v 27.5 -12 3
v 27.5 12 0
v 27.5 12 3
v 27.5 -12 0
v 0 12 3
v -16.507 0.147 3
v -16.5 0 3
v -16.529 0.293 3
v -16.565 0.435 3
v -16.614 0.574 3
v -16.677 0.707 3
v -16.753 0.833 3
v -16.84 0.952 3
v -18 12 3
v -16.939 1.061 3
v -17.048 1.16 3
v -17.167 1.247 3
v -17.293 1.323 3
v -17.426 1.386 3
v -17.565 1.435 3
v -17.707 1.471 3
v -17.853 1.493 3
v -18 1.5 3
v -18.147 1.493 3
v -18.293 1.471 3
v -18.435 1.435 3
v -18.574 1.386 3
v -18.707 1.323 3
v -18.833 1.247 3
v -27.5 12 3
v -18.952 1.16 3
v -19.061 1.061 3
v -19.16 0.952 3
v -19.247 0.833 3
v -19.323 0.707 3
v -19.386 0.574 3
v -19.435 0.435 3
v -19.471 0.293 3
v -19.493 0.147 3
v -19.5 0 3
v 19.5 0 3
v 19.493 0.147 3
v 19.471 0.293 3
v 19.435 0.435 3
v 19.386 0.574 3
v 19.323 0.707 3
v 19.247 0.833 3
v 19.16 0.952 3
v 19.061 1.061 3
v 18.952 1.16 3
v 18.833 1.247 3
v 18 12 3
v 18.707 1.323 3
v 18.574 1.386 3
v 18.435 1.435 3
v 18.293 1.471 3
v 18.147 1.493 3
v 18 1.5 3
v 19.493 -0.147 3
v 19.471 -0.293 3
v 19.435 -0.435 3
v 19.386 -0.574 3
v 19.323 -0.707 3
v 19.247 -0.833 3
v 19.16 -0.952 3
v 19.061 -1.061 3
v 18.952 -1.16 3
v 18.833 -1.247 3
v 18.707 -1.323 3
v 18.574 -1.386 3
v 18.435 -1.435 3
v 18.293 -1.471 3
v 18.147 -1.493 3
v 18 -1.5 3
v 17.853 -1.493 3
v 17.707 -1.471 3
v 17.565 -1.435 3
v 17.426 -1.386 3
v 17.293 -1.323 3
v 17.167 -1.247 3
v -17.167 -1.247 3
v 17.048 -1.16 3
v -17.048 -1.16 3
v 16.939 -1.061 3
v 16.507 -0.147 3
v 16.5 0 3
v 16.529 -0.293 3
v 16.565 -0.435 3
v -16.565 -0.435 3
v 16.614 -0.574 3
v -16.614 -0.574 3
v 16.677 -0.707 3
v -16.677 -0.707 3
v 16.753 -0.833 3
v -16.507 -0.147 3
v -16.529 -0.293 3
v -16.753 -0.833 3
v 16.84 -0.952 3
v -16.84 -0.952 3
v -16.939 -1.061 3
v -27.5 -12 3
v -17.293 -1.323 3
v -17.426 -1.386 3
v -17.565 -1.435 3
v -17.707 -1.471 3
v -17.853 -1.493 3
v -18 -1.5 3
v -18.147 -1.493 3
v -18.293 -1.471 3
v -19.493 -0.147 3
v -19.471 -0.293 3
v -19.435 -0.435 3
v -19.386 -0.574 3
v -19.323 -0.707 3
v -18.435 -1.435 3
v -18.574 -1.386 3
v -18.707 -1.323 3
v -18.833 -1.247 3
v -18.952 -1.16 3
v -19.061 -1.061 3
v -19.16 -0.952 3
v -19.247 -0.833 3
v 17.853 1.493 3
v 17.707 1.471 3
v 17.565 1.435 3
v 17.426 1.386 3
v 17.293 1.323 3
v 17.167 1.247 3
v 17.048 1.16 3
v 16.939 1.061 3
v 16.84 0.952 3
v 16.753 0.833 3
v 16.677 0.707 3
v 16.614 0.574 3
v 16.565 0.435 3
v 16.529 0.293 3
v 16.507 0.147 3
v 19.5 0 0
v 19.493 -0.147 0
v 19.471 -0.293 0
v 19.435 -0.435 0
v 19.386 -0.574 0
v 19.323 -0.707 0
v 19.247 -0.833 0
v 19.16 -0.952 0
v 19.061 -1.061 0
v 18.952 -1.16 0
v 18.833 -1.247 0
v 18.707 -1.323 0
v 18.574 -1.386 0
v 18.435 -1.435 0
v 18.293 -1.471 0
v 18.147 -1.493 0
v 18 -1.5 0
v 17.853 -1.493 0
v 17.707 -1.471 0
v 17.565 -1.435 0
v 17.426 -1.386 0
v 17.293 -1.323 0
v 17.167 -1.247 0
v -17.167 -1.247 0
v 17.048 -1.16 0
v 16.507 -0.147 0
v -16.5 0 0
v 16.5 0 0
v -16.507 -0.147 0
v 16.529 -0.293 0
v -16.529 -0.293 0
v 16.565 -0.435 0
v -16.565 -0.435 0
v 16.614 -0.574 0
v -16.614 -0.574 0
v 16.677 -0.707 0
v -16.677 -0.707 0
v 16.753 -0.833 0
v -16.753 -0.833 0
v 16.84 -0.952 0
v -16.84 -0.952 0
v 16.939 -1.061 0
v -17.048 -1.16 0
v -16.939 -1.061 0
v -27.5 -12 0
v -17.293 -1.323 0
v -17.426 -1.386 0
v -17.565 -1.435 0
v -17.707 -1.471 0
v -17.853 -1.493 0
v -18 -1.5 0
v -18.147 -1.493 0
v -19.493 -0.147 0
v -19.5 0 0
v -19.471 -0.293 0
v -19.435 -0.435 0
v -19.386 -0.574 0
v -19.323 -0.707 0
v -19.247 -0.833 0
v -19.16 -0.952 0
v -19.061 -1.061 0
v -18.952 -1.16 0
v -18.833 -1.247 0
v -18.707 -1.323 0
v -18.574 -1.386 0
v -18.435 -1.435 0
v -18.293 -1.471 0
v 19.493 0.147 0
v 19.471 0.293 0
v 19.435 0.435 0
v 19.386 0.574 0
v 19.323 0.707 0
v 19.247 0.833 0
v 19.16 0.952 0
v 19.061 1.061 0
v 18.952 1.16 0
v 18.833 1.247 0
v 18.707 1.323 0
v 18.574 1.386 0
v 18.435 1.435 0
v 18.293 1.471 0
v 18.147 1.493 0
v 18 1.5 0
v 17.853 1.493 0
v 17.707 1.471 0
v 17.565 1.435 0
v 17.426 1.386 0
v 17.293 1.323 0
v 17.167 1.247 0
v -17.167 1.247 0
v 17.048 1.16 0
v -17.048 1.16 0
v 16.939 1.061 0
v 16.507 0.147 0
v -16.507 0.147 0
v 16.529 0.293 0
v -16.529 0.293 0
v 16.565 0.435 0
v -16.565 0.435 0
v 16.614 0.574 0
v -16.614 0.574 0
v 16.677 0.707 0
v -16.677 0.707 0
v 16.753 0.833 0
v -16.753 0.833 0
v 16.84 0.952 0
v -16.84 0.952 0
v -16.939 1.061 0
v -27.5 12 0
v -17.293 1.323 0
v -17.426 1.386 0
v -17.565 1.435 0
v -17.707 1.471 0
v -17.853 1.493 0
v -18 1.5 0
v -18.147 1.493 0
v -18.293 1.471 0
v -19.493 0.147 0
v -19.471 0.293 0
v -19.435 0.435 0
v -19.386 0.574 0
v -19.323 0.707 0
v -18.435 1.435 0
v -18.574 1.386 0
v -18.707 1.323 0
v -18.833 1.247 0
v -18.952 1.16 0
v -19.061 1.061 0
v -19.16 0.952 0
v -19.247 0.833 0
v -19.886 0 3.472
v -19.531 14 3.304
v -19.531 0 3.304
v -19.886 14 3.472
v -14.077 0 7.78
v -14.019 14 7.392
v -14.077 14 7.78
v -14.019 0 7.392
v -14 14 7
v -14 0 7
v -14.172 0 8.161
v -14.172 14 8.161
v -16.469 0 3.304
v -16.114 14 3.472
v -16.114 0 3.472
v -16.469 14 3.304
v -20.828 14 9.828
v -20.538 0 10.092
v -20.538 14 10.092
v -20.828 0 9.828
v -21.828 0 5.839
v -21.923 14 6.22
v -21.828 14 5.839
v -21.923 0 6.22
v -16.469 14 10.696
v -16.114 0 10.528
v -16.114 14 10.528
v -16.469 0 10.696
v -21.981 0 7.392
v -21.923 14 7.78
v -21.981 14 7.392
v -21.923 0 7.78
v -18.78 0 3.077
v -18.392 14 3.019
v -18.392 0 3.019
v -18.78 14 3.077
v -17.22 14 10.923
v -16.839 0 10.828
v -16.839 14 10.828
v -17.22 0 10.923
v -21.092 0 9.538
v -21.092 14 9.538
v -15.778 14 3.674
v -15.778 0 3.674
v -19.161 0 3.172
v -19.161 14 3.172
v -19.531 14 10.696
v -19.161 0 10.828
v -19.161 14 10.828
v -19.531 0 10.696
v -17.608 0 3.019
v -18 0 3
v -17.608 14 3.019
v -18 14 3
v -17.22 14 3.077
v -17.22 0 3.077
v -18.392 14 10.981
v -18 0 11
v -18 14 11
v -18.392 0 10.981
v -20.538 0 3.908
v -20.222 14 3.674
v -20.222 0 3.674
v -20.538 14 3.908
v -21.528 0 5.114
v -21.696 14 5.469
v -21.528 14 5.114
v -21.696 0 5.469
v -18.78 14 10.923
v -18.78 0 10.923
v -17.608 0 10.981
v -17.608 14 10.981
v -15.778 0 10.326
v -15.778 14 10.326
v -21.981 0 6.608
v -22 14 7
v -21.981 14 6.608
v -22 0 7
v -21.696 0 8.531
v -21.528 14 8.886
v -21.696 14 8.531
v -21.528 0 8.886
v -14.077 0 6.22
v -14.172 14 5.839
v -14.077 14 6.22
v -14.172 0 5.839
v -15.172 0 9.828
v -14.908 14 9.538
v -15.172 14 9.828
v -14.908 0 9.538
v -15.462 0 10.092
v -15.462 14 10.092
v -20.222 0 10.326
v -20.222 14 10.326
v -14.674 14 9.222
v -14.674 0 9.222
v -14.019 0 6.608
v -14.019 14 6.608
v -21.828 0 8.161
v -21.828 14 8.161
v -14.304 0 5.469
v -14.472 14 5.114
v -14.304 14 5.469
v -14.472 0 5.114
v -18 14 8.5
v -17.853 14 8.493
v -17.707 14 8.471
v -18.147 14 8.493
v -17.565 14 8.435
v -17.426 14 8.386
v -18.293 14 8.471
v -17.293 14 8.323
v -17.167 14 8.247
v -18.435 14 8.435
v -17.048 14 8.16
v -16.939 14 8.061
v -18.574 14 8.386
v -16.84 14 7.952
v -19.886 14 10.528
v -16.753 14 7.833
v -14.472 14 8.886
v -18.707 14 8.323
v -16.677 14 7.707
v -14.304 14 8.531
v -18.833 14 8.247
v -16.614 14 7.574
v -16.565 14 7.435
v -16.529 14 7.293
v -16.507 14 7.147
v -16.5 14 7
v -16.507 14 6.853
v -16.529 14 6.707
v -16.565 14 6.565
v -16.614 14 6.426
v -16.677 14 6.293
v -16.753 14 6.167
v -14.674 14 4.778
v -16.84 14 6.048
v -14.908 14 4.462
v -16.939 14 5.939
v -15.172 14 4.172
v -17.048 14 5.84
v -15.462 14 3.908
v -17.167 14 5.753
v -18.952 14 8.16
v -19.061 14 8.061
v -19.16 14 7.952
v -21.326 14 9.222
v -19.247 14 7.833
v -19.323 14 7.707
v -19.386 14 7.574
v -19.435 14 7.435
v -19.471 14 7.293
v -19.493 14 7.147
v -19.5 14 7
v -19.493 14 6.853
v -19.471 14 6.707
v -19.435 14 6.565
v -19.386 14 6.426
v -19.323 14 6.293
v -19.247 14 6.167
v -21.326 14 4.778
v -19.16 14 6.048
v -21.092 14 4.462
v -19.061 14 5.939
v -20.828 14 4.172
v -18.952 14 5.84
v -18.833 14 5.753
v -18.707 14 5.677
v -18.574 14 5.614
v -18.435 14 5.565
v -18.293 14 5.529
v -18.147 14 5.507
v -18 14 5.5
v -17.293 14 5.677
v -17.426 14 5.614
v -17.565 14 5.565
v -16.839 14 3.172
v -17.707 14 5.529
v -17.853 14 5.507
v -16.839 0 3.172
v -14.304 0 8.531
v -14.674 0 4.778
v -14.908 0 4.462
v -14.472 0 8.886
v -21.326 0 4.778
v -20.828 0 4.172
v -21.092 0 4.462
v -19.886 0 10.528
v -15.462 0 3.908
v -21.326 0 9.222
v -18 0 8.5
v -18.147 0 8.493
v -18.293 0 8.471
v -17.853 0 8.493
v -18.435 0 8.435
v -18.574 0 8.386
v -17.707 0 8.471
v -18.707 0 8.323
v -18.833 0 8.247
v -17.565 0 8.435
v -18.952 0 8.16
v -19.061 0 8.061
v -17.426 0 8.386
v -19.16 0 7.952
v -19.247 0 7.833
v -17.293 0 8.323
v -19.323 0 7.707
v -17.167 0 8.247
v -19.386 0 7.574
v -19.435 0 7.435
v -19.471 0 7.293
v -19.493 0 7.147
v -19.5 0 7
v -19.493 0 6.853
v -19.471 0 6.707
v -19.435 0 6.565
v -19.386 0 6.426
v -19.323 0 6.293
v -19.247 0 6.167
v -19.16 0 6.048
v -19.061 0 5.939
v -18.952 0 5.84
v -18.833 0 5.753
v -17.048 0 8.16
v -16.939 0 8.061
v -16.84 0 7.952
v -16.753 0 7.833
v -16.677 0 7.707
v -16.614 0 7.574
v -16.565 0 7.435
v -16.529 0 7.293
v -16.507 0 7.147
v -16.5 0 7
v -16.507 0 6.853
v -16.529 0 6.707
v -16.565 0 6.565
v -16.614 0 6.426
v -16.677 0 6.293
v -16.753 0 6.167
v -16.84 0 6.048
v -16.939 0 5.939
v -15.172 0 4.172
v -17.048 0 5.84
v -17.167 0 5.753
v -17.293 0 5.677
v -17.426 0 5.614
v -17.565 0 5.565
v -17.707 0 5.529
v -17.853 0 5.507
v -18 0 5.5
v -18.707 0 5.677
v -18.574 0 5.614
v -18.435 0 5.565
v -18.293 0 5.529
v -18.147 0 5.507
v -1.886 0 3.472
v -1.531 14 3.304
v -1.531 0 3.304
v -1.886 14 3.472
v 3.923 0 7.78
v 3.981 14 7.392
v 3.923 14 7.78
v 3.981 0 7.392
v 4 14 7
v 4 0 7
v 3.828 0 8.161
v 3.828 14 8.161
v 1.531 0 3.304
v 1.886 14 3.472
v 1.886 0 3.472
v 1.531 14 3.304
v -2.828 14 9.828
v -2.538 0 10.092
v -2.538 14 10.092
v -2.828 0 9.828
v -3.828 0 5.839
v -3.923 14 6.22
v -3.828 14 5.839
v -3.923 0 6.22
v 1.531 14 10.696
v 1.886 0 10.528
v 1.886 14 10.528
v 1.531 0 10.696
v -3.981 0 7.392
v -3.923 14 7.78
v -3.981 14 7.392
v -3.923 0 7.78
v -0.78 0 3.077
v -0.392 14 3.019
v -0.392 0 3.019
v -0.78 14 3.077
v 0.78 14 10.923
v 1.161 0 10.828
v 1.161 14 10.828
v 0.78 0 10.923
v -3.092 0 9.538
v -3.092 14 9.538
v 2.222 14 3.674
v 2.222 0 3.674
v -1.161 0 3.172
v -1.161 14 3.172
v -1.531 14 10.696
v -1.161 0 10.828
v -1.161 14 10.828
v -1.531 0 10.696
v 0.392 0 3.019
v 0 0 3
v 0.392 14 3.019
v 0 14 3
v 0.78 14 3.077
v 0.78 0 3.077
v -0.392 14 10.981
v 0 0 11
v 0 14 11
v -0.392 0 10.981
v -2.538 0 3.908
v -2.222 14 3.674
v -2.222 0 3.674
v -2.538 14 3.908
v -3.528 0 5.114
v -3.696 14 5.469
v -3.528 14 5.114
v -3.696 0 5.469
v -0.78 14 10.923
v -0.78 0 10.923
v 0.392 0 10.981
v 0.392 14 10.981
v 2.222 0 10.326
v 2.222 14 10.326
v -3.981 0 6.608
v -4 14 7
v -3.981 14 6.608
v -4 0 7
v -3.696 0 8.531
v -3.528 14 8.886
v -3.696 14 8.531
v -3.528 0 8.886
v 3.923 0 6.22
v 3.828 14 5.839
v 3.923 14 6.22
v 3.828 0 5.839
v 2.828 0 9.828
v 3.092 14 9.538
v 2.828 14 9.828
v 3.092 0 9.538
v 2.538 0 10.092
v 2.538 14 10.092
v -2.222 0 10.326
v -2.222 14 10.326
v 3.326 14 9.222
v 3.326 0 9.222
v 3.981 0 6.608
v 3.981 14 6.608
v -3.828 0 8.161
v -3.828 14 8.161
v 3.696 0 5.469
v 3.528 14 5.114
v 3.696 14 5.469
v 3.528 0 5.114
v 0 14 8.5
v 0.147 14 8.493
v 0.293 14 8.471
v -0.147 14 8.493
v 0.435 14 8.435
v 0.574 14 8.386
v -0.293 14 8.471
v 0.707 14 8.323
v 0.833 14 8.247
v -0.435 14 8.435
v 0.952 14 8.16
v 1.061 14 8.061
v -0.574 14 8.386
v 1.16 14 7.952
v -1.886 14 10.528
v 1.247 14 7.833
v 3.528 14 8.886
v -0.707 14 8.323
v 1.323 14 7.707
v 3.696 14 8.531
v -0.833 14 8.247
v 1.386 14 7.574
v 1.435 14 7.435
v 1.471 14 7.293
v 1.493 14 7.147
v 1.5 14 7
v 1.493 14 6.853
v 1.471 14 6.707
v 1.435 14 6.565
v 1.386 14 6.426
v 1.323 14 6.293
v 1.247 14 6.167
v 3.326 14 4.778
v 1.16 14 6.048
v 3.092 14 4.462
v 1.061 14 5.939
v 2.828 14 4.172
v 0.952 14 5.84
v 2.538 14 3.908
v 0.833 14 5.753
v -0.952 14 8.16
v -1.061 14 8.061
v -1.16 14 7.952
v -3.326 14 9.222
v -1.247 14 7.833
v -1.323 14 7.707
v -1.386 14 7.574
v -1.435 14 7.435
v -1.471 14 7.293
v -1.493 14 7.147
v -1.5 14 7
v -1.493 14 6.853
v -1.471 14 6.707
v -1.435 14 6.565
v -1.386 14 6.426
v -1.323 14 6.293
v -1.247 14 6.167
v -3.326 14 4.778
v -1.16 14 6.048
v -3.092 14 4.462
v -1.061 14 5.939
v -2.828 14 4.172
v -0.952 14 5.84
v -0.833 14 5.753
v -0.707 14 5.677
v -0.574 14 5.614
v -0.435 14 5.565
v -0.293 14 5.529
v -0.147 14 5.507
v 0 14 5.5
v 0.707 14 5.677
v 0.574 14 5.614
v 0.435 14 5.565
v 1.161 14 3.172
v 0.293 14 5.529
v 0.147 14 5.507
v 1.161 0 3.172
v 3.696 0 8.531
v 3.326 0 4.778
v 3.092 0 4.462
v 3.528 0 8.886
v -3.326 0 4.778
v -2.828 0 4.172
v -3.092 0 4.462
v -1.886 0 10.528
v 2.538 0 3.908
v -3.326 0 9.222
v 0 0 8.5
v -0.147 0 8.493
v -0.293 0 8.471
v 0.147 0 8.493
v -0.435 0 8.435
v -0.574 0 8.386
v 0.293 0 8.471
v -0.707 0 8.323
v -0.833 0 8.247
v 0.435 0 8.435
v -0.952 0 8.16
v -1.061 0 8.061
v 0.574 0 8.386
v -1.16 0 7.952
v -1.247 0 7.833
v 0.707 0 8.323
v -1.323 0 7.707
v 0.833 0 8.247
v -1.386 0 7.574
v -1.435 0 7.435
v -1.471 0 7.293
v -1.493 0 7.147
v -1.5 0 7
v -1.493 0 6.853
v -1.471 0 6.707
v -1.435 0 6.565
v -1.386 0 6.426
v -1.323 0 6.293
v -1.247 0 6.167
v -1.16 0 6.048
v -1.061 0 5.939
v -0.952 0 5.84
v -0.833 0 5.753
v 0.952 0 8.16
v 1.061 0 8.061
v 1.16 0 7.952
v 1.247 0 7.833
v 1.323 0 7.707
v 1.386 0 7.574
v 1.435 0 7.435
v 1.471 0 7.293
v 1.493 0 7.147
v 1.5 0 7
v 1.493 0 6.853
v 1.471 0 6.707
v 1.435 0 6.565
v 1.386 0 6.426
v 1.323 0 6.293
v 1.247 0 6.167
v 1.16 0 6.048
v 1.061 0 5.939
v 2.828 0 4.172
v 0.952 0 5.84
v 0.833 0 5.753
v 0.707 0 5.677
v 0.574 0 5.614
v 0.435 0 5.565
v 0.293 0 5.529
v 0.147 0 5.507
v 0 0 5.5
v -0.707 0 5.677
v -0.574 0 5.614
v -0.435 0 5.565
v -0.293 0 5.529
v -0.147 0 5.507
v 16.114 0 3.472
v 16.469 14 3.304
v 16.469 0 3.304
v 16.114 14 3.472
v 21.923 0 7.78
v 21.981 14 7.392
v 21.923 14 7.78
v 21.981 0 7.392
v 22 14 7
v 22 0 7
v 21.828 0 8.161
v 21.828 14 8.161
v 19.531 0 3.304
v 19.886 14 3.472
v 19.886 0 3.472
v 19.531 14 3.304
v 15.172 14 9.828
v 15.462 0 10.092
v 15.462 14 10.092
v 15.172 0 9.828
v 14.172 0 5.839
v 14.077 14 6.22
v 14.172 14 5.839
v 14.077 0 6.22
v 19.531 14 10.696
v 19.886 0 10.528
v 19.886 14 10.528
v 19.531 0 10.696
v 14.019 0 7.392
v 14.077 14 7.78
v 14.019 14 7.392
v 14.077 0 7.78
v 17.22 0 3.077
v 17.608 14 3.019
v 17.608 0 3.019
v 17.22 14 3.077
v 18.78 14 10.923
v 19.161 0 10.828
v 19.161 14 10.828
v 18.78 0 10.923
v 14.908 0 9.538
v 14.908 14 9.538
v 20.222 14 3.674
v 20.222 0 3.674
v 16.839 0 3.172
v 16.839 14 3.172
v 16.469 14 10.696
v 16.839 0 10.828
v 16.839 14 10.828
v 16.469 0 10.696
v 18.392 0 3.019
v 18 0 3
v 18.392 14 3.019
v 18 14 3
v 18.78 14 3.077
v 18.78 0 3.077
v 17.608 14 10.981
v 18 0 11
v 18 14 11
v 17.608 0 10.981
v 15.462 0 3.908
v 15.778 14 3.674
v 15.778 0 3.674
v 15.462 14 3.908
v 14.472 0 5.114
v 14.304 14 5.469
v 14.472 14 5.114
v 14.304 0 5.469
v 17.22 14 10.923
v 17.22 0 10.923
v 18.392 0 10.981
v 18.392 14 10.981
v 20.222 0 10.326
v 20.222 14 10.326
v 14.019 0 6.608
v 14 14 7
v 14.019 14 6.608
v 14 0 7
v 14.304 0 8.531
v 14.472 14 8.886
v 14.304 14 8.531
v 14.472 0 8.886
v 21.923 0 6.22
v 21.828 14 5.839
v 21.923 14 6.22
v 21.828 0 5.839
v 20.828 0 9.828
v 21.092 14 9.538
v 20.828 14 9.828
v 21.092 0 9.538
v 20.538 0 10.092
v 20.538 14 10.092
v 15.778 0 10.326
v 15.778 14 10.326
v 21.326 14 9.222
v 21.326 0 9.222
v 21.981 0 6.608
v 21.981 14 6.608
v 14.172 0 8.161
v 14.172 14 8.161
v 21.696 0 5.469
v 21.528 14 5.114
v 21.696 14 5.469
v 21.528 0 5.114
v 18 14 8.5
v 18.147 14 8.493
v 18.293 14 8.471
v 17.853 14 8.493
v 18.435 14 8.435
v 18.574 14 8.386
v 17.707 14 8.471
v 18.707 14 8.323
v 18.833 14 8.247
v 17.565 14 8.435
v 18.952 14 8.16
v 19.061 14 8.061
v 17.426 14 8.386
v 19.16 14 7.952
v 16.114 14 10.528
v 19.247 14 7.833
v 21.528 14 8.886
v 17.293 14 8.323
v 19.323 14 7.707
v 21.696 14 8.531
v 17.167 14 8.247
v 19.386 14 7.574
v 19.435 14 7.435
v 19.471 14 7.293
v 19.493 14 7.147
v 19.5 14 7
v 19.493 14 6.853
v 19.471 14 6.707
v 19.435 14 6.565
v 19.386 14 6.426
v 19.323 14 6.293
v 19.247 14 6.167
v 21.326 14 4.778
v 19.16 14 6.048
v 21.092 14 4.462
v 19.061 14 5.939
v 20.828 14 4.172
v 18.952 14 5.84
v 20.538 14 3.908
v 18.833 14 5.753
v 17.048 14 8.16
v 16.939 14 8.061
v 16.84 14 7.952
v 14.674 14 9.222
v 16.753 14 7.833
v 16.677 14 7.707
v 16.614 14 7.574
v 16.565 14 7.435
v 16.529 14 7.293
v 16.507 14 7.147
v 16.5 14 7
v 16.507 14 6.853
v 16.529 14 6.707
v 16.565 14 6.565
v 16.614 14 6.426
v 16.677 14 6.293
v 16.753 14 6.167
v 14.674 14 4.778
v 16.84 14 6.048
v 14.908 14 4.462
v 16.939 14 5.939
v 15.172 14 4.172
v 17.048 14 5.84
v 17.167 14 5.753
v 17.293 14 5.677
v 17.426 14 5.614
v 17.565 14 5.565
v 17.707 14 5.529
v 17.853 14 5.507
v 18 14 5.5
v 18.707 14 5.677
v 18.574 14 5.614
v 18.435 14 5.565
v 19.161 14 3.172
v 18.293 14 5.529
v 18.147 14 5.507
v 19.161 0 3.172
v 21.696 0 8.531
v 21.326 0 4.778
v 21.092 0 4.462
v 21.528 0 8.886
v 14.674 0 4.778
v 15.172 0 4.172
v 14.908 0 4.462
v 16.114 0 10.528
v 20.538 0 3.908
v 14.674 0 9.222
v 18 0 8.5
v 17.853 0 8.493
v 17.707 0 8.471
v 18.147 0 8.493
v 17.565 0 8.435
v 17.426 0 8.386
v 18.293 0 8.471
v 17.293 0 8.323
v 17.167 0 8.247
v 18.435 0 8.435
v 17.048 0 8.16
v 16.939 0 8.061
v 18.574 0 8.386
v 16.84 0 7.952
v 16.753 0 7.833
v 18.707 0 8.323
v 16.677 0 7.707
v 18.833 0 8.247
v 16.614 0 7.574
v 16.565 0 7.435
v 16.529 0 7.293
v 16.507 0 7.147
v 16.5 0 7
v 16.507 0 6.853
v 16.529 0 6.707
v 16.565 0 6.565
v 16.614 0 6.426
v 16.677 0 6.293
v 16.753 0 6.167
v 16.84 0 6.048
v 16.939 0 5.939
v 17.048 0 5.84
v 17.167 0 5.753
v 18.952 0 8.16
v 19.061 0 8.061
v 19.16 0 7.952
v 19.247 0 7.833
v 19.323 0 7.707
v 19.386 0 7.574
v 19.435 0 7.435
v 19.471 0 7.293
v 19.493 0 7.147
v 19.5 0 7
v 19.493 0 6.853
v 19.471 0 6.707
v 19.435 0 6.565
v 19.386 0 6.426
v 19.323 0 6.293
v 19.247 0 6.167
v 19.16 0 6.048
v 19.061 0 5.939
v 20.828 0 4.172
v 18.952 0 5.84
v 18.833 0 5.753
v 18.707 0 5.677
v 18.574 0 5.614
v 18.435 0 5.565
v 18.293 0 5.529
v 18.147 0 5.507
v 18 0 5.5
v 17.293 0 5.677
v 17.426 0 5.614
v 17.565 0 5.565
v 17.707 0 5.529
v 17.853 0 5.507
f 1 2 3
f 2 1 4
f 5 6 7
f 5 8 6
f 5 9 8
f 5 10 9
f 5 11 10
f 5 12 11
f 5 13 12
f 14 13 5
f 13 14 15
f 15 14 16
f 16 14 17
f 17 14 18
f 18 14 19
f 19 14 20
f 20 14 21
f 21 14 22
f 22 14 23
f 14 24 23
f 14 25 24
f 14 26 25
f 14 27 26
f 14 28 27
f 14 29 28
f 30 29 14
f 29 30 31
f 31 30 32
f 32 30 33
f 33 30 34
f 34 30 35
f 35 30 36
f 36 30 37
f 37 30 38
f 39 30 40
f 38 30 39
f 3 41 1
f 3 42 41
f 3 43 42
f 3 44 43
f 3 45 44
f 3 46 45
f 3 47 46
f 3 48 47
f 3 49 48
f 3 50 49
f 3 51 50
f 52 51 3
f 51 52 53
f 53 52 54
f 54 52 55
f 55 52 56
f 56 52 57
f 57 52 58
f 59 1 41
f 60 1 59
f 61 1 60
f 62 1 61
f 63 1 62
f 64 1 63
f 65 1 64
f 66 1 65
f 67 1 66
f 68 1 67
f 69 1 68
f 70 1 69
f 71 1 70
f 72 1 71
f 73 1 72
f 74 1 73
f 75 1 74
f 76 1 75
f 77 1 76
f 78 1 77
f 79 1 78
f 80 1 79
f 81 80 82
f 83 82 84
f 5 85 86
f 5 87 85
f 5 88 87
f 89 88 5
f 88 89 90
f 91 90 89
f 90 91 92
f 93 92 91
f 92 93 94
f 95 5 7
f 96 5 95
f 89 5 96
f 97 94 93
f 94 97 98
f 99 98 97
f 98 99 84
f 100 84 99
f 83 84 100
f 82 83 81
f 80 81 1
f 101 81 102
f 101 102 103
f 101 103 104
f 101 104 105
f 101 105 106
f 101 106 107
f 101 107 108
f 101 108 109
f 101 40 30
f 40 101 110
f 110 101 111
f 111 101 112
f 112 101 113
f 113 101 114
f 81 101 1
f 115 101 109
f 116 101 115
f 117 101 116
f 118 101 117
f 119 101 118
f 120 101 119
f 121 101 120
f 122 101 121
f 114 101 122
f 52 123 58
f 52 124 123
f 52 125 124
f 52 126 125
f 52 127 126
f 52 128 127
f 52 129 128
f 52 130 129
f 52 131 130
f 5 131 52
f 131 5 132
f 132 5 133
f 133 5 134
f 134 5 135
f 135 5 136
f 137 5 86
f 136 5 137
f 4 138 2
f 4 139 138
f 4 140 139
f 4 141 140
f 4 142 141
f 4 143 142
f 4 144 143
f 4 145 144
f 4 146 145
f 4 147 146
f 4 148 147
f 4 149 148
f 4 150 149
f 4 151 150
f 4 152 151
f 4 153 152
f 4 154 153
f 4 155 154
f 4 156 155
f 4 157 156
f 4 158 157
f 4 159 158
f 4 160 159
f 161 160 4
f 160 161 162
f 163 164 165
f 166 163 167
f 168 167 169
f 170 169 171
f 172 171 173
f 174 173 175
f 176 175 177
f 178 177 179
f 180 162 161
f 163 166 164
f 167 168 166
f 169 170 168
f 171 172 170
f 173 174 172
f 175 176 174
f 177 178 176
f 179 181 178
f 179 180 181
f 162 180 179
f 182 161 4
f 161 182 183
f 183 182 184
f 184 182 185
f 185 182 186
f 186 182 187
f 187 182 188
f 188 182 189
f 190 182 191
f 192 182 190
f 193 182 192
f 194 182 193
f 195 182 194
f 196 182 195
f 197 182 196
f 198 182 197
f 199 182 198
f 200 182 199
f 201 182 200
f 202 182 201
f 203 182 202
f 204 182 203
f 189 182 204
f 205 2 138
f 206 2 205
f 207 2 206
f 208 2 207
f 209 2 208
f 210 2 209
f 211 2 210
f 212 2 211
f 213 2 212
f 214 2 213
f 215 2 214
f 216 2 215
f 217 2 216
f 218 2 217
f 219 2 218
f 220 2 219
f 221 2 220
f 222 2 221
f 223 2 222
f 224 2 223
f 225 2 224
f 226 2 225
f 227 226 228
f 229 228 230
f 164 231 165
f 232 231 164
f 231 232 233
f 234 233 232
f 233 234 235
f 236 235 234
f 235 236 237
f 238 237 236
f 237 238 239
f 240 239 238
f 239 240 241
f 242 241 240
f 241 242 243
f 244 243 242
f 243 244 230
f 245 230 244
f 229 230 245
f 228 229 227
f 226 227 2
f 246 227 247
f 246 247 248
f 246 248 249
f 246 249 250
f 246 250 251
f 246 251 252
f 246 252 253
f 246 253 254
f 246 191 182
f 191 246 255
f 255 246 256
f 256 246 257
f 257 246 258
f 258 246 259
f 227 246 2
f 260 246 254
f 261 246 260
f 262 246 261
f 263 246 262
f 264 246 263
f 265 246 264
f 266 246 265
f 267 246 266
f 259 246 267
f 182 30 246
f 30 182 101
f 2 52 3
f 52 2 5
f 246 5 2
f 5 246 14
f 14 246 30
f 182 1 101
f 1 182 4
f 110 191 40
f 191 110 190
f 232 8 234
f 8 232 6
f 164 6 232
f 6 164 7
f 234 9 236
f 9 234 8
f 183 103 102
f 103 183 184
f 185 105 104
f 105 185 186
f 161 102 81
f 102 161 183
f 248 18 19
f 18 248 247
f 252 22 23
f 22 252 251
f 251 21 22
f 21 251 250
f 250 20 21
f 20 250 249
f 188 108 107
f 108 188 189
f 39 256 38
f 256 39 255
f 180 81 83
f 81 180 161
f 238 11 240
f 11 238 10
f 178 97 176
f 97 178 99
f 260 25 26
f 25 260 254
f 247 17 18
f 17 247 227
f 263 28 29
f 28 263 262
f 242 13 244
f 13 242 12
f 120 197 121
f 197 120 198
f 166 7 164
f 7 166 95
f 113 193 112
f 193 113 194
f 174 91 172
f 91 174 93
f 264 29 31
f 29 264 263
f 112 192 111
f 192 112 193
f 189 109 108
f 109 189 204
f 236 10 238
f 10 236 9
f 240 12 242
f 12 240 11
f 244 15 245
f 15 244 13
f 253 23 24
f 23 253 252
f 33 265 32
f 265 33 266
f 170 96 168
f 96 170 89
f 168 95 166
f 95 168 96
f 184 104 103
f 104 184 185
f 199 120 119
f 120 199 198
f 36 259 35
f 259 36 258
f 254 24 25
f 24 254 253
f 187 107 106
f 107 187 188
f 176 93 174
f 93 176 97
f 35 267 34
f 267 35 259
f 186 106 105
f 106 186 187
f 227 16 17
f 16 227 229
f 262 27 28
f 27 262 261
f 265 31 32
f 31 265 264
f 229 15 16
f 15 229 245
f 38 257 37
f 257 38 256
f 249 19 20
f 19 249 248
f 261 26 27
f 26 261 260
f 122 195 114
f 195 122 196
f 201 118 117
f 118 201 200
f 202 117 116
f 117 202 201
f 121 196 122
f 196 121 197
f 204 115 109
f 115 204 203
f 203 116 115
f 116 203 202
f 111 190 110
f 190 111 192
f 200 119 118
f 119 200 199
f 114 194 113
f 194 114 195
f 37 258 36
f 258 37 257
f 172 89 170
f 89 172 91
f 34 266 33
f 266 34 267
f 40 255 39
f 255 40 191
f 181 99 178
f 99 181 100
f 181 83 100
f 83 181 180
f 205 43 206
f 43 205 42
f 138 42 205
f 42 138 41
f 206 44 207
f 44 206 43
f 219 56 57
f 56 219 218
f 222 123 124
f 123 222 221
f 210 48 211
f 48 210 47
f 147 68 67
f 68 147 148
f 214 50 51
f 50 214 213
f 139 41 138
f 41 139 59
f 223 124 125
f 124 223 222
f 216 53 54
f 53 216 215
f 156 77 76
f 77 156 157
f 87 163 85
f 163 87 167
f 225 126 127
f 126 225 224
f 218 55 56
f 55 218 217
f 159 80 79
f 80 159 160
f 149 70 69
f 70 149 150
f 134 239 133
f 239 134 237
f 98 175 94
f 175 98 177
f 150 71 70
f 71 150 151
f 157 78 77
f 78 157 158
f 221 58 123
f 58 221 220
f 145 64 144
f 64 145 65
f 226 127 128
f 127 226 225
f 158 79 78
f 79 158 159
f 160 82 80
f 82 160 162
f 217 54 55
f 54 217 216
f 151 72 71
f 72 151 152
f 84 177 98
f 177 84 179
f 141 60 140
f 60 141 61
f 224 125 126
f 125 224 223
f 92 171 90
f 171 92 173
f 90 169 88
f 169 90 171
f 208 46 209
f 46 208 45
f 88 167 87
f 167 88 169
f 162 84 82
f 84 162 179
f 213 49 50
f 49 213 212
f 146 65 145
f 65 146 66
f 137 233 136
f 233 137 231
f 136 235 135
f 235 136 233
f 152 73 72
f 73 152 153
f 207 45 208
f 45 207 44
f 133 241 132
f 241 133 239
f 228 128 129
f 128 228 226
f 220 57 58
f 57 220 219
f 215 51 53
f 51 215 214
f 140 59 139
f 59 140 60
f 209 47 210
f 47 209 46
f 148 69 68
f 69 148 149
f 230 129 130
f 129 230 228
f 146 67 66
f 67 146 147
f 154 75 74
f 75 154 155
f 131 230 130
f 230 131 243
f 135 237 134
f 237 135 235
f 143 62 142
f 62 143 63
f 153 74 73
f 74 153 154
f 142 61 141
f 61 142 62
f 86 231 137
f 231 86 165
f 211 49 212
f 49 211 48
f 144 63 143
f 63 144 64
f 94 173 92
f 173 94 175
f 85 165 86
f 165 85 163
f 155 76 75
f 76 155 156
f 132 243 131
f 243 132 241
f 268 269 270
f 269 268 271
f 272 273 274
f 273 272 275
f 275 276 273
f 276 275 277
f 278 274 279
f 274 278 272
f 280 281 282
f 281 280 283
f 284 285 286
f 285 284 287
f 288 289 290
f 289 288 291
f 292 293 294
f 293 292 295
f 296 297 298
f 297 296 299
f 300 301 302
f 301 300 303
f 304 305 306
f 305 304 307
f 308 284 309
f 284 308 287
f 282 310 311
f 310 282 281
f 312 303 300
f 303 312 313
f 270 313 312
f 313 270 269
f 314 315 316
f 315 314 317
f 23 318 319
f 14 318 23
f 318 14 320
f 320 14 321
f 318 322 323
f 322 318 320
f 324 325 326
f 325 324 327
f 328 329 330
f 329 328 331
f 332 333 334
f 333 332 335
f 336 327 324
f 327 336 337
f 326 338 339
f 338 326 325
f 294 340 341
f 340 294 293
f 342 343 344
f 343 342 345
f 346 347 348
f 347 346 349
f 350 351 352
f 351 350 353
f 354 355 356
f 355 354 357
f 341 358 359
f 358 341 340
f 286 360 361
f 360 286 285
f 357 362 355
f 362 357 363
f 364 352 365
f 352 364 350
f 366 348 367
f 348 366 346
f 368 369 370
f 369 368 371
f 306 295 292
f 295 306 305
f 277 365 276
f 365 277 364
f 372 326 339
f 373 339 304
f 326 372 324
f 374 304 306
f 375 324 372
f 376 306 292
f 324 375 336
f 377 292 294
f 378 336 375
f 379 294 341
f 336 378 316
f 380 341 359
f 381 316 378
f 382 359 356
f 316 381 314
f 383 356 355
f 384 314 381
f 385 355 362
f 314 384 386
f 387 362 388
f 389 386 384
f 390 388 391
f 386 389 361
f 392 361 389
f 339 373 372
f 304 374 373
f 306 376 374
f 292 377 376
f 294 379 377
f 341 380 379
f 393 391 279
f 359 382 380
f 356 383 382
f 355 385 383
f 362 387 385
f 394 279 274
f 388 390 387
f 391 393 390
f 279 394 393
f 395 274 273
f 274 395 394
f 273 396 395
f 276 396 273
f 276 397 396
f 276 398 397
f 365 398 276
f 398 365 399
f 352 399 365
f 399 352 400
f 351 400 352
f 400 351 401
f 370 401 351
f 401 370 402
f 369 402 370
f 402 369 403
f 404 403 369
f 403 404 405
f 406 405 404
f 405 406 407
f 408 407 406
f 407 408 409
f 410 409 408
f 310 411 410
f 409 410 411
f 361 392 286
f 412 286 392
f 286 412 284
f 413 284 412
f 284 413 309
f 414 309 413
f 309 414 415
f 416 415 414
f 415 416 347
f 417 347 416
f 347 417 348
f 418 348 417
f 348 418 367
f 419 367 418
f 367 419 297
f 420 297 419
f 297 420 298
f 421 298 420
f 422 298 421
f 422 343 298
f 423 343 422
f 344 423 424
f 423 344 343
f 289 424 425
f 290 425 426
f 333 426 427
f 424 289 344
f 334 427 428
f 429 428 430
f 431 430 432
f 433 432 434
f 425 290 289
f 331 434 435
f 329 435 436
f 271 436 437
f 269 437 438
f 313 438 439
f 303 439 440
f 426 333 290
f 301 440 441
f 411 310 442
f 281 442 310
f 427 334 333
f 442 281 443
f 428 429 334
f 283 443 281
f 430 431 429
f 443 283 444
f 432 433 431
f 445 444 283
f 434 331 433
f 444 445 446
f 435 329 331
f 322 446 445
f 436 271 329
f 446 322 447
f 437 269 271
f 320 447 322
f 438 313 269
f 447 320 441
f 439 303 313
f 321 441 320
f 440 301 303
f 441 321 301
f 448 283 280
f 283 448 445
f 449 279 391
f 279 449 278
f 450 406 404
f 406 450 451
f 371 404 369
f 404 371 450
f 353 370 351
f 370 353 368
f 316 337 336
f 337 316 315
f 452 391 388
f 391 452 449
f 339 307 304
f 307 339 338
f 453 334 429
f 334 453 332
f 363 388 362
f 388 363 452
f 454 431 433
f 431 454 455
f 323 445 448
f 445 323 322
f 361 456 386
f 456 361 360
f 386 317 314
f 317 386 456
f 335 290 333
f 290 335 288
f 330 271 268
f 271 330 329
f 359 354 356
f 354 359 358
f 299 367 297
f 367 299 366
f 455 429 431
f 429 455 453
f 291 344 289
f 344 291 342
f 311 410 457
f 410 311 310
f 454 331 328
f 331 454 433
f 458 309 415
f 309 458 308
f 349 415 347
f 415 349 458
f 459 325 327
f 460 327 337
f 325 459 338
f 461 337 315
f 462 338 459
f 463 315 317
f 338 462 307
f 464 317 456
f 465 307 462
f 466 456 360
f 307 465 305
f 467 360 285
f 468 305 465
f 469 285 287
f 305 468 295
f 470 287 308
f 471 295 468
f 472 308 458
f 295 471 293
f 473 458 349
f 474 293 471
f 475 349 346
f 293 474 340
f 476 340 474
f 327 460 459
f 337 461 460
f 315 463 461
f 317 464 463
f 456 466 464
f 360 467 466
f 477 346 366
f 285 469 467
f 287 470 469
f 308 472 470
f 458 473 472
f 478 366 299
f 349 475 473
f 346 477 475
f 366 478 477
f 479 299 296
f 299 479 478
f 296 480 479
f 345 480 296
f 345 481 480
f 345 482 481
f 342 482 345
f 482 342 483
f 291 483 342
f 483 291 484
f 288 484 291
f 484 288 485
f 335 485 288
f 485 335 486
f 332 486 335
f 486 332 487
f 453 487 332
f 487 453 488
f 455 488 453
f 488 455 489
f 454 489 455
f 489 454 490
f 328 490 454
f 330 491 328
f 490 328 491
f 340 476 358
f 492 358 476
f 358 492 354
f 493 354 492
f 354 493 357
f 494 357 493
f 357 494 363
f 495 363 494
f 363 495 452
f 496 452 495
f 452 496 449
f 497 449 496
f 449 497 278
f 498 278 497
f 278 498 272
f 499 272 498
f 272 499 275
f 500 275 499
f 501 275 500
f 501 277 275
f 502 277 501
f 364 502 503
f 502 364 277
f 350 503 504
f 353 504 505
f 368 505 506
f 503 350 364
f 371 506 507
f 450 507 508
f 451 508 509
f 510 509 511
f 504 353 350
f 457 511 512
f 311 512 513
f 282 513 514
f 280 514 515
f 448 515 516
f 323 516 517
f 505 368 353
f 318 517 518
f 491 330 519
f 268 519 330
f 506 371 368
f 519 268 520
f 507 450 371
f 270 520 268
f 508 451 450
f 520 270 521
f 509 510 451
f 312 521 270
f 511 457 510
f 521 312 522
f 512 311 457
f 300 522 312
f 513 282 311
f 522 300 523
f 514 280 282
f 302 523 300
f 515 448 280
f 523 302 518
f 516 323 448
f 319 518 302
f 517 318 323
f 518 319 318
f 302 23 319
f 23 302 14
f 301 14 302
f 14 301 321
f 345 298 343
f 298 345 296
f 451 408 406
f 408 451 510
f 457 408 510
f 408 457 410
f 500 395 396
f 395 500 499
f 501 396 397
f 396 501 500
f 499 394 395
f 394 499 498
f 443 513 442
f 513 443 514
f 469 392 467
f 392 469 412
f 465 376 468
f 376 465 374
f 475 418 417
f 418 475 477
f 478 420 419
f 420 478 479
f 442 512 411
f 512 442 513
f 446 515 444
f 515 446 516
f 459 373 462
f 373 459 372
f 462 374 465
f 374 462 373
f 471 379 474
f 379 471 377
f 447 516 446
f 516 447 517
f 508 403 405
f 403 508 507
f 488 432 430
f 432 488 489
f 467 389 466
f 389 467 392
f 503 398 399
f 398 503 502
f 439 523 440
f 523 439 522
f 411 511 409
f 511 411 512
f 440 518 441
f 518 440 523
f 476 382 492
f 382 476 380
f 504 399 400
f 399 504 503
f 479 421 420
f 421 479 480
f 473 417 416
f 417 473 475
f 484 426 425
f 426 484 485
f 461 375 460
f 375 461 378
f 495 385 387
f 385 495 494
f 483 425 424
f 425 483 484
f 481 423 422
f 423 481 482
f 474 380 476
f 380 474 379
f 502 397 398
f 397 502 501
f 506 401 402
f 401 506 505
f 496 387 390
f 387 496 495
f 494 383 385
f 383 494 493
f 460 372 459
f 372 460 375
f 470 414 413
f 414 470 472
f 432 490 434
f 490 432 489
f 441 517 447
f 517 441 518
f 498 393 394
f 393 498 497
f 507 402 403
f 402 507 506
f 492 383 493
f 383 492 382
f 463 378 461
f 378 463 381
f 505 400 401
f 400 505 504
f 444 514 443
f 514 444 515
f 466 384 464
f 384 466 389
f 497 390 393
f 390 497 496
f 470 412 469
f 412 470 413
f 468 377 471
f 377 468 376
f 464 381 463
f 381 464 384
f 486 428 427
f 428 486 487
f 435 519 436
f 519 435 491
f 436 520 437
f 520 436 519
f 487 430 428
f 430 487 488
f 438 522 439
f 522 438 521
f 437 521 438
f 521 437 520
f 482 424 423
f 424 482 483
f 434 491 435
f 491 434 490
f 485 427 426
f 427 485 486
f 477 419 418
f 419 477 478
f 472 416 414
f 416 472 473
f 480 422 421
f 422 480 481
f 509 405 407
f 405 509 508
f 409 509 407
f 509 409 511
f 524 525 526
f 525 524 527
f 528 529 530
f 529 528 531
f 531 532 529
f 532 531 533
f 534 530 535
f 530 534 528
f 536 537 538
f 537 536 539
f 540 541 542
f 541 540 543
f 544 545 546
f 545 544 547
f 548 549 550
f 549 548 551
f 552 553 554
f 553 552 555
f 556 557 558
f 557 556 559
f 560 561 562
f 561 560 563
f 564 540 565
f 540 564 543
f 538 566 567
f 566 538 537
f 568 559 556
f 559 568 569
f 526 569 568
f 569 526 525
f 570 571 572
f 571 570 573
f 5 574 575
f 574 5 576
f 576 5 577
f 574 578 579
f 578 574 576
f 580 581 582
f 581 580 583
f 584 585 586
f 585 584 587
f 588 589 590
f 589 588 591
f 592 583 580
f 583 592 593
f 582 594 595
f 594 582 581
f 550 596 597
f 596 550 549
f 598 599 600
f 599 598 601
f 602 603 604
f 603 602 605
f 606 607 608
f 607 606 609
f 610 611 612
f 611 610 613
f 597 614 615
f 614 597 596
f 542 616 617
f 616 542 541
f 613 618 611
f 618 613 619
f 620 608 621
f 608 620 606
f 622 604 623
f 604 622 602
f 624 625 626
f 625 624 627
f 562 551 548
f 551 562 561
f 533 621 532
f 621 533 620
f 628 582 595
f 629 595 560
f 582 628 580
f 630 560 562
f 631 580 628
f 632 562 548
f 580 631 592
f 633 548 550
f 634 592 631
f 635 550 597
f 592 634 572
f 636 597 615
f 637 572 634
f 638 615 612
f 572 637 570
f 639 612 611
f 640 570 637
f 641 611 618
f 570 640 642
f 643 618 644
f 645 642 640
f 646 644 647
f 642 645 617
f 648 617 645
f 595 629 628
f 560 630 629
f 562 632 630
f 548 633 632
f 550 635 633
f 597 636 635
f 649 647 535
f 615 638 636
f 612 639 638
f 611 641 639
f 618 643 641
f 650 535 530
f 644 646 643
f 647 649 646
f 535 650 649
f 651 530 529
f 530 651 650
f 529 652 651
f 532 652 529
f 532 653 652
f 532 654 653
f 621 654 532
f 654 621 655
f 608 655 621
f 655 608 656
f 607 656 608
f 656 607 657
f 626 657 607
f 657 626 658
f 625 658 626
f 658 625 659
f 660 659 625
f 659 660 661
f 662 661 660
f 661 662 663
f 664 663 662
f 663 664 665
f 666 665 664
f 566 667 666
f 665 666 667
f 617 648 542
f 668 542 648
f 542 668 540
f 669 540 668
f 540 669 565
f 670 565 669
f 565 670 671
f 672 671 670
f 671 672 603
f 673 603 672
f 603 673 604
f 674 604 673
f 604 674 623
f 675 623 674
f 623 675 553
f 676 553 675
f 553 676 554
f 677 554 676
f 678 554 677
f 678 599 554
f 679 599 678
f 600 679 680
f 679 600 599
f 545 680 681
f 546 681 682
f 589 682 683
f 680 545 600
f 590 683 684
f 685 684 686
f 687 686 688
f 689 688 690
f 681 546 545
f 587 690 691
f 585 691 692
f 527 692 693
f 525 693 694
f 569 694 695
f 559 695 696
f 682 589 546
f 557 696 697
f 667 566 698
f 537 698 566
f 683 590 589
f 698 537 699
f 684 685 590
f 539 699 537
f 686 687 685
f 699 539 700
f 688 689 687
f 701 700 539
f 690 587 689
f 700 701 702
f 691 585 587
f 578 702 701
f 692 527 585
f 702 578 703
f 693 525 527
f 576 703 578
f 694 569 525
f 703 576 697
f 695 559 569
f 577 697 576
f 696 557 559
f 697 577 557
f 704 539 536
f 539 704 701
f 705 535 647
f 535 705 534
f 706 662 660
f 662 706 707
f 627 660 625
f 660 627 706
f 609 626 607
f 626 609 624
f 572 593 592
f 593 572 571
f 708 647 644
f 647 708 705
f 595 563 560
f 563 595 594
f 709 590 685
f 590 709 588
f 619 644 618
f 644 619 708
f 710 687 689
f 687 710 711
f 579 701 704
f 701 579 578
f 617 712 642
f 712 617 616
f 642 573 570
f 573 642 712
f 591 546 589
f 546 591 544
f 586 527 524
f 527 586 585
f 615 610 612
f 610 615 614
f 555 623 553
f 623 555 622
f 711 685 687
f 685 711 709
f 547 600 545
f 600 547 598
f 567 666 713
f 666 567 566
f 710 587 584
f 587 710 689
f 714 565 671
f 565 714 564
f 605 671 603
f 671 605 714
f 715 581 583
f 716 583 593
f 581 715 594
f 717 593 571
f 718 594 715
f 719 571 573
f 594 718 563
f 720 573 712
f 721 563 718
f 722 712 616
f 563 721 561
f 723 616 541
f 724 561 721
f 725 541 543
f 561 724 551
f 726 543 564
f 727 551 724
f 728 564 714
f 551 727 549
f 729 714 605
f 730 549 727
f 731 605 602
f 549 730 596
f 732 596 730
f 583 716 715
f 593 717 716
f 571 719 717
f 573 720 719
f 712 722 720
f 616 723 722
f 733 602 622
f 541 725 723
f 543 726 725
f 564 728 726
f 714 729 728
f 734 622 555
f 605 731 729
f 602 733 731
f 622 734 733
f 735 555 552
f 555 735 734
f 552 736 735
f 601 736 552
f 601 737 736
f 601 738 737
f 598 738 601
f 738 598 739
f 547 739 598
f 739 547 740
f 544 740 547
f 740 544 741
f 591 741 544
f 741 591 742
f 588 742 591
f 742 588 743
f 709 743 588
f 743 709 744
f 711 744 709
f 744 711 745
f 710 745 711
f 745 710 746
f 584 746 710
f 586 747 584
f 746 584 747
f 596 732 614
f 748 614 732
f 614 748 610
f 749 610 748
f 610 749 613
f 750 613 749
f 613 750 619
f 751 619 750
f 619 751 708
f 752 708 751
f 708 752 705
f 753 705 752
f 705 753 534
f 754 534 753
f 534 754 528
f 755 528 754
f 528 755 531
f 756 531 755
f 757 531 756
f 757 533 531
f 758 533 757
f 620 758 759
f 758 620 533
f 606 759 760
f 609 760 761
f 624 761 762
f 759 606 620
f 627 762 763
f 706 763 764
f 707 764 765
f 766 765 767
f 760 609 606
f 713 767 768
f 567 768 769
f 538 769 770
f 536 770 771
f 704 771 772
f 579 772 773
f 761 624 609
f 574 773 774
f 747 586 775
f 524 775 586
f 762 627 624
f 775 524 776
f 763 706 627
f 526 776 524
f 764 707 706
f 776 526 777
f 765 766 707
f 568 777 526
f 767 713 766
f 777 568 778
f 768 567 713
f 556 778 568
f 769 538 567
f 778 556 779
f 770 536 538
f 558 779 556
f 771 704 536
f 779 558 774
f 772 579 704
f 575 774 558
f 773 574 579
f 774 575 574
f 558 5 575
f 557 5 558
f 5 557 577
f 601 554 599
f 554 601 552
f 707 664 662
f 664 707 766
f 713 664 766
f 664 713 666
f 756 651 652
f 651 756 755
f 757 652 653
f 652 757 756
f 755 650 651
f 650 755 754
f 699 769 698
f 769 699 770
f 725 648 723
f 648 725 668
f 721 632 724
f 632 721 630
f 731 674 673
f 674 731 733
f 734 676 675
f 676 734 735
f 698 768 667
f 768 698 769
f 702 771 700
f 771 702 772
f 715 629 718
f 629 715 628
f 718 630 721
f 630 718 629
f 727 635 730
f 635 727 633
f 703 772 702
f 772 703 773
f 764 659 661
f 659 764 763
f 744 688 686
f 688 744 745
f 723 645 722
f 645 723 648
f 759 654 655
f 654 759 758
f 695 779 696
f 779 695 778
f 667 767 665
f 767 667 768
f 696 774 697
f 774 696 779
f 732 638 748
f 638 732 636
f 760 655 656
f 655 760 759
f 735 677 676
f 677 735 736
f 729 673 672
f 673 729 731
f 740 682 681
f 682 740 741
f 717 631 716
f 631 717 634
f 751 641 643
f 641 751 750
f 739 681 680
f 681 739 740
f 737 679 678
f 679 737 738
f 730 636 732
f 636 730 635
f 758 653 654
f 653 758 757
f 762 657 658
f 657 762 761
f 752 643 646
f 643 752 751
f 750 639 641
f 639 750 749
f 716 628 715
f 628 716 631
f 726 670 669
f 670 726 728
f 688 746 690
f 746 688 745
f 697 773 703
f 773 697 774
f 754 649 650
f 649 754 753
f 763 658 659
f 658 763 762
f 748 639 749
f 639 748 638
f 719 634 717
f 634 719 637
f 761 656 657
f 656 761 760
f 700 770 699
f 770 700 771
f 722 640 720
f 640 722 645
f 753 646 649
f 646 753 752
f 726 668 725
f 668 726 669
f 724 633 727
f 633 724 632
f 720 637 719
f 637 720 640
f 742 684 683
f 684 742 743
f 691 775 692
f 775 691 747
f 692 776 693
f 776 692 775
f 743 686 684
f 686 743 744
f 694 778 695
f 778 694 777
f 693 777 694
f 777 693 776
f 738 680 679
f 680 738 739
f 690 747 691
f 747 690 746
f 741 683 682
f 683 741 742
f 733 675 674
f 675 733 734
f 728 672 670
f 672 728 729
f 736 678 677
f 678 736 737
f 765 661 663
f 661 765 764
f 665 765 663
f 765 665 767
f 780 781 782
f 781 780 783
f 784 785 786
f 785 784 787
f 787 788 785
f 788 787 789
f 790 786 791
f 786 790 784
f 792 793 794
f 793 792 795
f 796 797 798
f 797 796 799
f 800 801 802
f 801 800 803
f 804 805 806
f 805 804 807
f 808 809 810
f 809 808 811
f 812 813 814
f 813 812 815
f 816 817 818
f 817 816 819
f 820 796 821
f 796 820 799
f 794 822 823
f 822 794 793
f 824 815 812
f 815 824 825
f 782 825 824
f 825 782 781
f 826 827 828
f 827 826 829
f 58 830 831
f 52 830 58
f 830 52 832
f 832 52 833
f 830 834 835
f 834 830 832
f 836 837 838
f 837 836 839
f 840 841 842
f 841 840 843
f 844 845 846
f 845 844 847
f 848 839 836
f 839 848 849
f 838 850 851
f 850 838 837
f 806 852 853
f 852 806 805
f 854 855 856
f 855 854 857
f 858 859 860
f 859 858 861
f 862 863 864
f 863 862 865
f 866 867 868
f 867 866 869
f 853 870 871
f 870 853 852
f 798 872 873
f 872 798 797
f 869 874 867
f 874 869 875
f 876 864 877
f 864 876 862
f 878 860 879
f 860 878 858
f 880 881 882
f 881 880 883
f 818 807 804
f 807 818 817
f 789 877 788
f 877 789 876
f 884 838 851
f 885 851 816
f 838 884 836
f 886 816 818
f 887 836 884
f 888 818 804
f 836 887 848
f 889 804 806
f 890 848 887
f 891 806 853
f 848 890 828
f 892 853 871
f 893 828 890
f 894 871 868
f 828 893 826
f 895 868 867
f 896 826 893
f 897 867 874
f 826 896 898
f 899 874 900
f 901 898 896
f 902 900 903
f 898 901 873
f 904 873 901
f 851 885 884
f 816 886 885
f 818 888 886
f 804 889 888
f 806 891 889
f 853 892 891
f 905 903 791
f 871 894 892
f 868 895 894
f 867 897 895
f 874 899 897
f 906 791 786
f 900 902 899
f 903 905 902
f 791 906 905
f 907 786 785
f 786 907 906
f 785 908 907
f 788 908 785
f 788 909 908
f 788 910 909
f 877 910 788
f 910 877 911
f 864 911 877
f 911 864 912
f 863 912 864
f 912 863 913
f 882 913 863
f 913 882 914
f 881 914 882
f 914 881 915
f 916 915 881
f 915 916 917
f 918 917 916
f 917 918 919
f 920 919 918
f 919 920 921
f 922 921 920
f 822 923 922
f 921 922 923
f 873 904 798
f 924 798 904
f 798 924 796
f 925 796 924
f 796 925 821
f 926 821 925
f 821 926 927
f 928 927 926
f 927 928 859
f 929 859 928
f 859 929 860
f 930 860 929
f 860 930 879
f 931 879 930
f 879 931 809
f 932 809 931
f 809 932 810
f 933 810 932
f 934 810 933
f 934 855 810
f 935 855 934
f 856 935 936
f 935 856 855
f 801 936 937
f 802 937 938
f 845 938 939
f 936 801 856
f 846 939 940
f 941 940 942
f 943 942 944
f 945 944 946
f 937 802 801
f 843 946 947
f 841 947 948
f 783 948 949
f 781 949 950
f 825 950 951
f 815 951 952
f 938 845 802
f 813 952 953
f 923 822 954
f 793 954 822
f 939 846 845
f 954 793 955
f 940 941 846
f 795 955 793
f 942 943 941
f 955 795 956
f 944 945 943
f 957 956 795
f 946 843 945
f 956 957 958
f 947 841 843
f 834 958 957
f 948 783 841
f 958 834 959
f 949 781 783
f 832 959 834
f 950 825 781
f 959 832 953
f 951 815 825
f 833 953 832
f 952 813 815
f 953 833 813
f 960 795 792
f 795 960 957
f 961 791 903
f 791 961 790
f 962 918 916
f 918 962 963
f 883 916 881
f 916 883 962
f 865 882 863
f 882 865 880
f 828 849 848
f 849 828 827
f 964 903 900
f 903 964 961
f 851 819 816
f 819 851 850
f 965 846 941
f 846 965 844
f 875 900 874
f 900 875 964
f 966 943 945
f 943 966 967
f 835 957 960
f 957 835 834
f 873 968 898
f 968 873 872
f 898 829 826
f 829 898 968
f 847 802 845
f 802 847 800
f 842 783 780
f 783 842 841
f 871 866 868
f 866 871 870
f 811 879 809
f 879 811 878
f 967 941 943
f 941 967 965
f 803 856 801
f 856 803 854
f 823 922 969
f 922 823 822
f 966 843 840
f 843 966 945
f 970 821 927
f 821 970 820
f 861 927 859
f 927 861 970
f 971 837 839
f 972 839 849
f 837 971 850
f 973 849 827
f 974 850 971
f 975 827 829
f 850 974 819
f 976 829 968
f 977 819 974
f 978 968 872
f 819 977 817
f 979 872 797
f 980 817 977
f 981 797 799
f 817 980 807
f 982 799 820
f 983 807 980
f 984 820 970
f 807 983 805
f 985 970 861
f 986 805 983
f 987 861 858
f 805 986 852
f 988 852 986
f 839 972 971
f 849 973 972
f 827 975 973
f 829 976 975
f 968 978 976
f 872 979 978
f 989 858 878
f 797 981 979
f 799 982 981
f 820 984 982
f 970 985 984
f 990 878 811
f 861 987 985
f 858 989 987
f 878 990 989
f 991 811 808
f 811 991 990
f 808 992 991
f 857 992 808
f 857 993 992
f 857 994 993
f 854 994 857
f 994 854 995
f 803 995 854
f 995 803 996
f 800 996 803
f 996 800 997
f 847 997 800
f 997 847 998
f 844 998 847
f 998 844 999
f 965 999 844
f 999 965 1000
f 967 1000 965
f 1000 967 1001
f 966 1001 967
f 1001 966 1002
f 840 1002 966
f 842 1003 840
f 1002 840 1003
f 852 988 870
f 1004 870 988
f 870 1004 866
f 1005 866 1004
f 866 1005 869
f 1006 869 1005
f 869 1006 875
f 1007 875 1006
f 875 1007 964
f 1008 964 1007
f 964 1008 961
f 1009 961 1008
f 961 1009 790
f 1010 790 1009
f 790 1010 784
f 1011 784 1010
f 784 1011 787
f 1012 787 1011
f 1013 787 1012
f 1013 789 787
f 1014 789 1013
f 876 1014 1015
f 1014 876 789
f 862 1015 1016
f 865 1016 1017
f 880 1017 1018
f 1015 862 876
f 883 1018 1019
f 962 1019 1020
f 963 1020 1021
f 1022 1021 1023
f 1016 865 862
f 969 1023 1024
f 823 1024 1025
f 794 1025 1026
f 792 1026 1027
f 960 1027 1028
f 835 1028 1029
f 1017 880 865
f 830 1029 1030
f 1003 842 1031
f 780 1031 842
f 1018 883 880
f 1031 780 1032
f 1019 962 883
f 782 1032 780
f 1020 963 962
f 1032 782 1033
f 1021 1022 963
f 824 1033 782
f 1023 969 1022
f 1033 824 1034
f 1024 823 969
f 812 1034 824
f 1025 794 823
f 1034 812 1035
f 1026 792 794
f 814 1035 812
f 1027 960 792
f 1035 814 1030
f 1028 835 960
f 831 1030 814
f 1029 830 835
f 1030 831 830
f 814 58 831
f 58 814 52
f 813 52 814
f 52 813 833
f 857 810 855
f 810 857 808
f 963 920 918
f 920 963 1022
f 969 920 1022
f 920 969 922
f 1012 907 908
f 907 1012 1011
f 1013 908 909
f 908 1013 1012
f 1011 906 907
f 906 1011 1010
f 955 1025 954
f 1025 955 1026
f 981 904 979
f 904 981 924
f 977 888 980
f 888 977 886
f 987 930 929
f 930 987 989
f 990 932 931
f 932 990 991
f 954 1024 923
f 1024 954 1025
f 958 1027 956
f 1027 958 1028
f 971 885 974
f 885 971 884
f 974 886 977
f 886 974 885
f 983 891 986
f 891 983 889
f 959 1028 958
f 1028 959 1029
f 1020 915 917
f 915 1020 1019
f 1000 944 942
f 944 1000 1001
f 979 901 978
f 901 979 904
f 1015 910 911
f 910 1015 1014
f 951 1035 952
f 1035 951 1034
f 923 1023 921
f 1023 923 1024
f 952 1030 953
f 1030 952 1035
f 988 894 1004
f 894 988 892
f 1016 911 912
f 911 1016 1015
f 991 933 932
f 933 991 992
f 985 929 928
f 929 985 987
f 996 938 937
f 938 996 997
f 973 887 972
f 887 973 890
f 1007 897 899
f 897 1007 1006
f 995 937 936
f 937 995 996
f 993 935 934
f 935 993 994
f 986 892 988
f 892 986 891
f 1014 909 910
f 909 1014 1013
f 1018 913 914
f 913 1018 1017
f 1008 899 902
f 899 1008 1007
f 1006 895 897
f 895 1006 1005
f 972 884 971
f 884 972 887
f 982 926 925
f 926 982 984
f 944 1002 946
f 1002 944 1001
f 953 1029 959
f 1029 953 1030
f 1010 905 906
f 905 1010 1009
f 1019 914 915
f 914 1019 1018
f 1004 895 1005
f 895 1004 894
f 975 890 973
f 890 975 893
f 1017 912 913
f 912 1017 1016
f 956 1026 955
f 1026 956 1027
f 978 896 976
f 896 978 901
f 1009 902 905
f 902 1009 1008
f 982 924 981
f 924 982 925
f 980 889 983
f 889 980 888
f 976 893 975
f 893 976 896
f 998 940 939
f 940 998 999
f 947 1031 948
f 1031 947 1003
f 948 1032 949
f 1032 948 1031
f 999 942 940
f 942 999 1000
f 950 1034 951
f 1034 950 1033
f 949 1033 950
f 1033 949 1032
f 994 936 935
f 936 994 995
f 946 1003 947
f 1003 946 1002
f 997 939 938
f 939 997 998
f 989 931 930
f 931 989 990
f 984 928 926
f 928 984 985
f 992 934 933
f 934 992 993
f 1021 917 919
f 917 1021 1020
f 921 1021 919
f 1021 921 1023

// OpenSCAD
// Generated with SolidPython2 for OpenSCAD task-015
$fn = 64;

union() {
	difference() {
		translate(v = [-27.5, -12.0, 0]) {
			cube(size = [55, 24, 3]);
		}
		translate(v = [-18, 0, -1]) {
			cylinder(h = 5, r = 1.5);
		}
		translate(v = [18, 0, -1]) {
			cylinder(h = 5, r = 1.5);
		}
	}
	translate(v = [-18, 14, 7]) {
		rotate(a = [90, 0, 0]) {
			difference() {
				cylinder(h = 14, r = 4);
				cylinder(h = 16, r = 1.5);
			}
		}
	}
	translate(v = [0, 14, 7]) {
		rotate(a = [90, 0, 0]) {
			difference() {
				cylinder(h = 14, r = 4);
				cylinder(h = 16, r = 1.5);
			}
		}
	}
	translate(v = [18, 14, 7]) {
		rotate(a = [90, 0, 0]) {
			difference() {
				cylinder(h = 14, r = 4);
				cylinder(h = 16, r = 1.5);
			}
		}
	}
}
